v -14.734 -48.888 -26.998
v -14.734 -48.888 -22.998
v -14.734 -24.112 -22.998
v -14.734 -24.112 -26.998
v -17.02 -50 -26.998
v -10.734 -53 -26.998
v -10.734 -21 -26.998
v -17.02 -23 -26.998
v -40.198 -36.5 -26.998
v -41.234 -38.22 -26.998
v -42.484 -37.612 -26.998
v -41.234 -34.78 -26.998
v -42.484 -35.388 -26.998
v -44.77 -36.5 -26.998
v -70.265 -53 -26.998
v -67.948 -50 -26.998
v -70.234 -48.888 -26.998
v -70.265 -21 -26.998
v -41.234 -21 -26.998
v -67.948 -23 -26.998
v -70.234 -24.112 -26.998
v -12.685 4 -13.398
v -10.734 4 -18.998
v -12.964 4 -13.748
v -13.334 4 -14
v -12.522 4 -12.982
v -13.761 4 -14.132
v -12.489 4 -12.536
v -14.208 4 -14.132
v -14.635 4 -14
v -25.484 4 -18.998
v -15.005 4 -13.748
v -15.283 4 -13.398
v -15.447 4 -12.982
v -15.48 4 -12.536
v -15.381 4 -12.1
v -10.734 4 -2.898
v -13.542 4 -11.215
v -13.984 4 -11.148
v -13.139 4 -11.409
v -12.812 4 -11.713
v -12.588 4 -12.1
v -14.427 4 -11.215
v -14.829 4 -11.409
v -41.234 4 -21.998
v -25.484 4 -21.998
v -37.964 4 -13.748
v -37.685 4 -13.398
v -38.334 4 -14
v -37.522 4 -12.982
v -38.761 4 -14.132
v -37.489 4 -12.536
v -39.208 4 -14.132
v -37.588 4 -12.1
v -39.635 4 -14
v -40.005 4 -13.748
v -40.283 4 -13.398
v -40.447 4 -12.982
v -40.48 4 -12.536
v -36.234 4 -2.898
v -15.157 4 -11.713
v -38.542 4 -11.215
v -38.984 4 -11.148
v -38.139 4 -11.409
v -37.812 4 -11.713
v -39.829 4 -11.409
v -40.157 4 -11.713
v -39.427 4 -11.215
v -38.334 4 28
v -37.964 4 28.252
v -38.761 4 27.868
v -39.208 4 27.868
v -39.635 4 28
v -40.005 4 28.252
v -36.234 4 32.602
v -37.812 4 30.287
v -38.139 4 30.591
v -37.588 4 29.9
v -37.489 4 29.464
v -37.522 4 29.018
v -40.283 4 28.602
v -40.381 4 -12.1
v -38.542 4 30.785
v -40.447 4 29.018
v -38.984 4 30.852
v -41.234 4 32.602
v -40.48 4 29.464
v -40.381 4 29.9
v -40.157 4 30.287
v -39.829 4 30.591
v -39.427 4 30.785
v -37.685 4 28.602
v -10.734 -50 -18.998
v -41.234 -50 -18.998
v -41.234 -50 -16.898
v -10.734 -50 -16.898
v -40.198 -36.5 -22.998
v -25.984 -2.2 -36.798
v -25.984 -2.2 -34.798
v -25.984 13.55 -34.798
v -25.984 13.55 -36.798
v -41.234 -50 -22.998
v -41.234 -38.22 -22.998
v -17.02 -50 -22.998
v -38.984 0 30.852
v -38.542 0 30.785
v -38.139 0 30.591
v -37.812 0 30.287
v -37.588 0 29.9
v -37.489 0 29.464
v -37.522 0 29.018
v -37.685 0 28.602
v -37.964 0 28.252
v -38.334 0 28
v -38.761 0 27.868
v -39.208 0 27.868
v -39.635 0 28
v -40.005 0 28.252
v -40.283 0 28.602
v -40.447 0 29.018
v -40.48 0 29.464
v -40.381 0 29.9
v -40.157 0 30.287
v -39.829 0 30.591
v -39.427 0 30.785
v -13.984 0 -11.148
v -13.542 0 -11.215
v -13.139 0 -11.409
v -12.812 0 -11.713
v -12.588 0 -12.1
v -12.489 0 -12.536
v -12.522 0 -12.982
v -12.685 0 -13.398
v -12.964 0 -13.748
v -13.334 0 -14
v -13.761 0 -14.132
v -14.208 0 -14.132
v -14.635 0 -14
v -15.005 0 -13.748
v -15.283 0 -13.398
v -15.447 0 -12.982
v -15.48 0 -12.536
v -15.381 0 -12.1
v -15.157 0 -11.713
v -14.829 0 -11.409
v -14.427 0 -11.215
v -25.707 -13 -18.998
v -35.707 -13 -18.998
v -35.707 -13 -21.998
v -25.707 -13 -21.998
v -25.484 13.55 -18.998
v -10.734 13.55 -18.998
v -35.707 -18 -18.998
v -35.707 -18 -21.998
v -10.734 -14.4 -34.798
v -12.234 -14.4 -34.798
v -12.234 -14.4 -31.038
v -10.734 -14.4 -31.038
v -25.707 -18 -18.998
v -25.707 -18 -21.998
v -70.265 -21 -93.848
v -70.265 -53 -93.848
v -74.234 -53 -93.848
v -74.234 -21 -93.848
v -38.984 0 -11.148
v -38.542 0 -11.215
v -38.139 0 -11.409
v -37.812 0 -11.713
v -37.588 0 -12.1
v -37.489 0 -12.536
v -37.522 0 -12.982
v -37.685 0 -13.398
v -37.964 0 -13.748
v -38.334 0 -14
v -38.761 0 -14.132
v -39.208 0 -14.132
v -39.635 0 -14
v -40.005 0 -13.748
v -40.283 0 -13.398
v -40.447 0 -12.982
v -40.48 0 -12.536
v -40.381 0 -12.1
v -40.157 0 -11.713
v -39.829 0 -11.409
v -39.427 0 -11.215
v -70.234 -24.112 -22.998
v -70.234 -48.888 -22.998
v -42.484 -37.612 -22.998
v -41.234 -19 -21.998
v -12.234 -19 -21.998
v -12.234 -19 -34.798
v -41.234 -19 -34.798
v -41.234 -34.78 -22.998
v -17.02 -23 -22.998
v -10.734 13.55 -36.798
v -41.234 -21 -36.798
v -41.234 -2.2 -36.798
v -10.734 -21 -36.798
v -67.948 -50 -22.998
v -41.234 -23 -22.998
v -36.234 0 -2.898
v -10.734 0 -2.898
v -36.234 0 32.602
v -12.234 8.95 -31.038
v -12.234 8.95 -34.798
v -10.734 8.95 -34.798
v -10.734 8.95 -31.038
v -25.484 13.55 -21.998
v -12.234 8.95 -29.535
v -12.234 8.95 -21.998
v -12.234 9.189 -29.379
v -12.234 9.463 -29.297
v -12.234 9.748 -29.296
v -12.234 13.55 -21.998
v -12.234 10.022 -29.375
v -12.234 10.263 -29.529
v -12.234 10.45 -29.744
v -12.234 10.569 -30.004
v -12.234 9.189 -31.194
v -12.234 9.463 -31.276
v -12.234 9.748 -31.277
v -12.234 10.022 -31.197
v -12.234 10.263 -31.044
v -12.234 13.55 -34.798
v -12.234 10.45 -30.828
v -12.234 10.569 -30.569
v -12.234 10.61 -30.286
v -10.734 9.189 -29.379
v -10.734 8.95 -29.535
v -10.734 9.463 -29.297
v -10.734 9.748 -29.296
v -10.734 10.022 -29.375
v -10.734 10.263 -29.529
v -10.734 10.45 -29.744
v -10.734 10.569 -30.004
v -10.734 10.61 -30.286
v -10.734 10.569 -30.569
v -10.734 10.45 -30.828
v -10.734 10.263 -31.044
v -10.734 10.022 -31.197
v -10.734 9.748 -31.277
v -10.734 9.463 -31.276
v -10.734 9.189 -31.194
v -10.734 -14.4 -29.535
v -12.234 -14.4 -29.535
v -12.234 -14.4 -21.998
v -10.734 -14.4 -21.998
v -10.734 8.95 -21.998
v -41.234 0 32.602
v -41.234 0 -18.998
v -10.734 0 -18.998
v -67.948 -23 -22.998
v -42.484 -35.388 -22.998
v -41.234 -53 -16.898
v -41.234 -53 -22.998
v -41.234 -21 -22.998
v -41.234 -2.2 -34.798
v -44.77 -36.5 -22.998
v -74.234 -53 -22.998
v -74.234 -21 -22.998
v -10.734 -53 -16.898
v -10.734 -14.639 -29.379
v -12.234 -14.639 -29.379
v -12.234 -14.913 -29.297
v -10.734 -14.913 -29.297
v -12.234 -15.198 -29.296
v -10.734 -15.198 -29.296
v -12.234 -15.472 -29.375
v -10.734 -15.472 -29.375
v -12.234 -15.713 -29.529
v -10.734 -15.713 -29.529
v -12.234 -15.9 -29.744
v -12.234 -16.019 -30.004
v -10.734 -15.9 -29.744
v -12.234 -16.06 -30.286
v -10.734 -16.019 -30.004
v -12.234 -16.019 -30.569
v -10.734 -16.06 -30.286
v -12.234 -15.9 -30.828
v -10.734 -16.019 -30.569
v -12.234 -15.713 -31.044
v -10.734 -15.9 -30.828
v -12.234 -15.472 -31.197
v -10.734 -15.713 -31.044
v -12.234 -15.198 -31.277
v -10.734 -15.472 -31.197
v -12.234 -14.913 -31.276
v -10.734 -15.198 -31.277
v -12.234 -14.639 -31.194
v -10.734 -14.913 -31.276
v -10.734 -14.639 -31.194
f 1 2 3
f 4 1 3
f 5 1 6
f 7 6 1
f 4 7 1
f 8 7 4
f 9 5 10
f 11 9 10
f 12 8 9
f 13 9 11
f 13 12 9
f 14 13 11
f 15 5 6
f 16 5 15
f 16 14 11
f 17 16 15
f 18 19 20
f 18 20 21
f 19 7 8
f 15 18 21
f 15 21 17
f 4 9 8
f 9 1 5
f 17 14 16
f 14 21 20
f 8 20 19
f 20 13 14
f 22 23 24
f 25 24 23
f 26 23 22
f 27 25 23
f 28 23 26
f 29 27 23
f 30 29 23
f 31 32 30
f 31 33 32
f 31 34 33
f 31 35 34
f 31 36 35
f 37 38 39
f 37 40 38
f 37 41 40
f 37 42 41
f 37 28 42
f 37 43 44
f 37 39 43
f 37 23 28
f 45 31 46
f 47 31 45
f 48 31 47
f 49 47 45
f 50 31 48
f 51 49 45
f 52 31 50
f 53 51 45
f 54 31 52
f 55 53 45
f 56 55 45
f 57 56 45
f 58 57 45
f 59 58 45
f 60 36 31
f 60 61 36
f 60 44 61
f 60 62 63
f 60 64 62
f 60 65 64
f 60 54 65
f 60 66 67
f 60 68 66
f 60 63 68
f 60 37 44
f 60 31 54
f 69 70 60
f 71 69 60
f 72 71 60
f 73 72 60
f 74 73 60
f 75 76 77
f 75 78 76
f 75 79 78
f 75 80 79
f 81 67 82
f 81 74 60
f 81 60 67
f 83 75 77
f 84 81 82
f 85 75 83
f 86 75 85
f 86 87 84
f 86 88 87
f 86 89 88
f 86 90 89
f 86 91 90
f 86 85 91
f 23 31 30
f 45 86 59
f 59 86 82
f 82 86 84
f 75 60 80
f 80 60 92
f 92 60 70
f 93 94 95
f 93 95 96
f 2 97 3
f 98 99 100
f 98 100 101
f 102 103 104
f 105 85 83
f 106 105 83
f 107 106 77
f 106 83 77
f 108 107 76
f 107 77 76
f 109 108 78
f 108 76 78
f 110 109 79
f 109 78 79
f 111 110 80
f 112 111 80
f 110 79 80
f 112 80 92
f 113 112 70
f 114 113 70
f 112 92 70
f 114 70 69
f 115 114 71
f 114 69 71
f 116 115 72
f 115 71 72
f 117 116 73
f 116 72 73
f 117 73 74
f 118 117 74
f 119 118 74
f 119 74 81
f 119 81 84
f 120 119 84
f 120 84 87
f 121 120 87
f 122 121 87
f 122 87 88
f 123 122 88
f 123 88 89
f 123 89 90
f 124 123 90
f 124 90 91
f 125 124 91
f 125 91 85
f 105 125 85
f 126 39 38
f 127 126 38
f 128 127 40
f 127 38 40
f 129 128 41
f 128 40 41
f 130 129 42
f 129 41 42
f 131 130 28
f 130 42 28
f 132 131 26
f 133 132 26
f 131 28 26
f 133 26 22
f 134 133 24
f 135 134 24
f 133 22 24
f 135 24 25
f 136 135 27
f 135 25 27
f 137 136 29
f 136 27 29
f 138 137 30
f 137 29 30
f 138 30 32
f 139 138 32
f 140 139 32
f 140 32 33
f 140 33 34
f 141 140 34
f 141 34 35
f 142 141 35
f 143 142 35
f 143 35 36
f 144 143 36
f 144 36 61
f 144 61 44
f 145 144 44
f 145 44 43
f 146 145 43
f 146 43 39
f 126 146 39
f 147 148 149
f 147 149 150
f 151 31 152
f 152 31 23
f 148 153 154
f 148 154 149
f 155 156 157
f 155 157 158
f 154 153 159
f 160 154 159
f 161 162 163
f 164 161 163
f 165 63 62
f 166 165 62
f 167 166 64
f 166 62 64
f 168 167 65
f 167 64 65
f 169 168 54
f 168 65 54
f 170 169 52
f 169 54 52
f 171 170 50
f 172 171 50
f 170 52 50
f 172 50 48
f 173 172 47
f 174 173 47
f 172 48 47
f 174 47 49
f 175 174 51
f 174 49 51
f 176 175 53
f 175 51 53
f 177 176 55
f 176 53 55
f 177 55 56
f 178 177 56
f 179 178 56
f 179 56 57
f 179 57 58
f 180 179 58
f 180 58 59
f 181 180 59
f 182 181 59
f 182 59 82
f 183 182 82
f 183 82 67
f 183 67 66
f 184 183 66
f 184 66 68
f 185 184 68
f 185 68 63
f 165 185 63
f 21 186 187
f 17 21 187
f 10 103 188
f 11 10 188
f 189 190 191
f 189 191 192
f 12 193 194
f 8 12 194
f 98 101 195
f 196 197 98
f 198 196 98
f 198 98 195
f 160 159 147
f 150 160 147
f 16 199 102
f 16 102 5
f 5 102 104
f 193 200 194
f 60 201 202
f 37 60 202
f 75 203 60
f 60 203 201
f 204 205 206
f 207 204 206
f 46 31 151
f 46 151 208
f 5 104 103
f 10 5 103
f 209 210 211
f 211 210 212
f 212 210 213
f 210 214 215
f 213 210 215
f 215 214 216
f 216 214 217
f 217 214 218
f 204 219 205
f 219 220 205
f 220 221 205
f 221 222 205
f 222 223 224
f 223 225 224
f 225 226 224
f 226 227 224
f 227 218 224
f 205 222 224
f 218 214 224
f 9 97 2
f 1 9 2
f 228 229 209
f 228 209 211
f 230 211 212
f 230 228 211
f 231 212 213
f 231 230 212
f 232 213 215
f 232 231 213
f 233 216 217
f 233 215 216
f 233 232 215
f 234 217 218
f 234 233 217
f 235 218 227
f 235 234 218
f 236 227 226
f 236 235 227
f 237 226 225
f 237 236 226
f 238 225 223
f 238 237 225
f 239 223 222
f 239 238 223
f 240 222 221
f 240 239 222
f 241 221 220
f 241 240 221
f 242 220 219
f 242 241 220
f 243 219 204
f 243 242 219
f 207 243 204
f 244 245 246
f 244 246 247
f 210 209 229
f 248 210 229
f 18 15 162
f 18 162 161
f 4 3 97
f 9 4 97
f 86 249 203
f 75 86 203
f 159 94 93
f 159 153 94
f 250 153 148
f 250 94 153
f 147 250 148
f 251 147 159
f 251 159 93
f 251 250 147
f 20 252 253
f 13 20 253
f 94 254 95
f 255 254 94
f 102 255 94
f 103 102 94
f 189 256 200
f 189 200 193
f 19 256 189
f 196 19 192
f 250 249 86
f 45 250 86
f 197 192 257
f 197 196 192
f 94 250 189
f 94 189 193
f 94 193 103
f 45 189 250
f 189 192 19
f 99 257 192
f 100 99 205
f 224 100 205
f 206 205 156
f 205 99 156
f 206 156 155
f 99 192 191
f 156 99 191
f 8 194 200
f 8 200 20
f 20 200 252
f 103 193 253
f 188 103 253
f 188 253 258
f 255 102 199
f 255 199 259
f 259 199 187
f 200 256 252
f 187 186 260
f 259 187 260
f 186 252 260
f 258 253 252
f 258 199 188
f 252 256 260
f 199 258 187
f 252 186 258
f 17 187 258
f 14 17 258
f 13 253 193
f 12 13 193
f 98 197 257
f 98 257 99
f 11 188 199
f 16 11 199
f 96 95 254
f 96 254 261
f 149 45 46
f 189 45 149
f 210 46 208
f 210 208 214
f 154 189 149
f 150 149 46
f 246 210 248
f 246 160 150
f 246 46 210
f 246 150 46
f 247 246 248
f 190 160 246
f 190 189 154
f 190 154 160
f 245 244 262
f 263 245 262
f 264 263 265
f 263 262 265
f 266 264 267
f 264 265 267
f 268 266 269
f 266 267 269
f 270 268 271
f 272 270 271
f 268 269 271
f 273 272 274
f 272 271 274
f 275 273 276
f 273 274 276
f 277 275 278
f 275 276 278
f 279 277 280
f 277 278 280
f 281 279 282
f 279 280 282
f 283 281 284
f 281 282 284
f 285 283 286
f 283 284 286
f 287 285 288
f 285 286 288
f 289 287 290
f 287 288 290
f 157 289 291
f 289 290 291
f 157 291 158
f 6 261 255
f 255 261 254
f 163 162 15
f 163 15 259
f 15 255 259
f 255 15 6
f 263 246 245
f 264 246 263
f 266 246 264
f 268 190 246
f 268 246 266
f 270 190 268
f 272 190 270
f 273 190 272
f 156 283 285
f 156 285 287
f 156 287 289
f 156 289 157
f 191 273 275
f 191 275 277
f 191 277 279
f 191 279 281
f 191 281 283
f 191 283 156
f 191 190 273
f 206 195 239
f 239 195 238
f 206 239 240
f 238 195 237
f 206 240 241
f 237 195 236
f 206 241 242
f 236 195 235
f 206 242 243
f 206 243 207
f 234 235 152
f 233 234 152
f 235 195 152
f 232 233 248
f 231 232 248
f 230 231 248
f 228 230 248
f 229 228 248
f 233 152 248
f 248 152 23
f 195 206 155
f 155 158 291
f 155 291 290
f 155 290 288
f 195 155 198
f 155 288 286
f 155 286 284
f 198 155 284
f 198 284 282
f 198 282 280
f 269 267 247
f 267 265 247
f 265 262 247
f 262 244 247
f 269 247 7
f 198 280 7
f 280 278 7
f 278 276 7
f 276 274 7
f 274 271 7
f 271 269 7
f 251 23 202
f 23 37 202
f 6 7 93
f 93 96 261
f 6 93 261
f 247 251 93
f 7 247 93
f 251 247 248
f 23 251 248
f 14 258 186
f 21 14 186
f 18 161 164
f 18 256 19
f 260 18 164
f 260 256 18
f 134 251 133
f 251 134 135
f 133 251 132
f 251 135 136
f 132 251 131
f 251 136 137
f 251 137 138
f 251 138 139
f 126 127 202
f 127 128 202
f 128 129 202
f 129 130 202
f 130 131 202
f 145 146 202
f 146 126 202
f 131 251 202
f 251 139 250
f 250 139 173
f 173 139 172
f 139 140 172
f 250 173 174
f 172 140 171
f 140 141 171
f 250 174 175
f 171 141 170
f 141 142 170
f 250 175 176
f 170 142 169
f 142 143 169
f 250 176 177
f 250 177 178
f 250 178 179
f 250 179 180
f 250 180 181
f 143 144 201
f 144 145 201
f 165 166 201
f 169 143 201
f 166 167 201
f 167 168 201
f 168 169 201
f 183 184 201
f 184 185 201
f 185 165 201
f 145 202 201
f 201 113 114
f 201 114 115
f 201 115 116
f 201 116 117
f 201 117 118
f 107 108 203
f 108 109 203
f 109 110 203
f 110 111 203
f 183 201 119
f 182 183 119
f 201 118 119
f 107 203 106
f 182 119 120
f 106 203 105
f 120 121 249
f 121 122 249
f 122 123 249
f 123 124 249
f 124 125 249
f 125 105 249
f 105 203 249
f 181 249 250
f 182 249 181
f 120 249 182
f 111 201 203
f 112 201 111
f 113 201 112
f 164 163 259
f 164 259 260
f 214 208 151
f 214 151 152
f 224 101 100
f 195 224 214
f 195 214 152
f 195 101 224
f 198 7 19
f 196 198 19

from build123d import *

# Parameters (mm, degrees)
SKETCH1_W            = 25.5
SKETCH1_H            = 14
BOSS_EXTRUDE1_DEPTH  = 4
SKETCH2_R            = 1.5
CUT_EXTRUDE1_DEPTH   = 53.71750714
SKETCH3_W            = 30.5
SKETCH3_H            = 4
BOSS_EXTRUDE2_DEPTH  = 5.1
SKETCH4_W            = 30.5
SKETCH4_H            = 3
BOSS_EXTRUDE3_DEPTH  = 21
SKETCH5_W            = 30.5
SKETCH5_H            = 2
BOSS_EXTRUDE8_DEPTH  = 14.8
SKETCH10_W           = 30.5
SKETCH10_H           = 2
BOSS_EXTRUDE9_DEPTH  = 16.8
SKETCH11_W           = 1.5
SKETCH11_H           = 12.8
BOSS_EXTRUDE10_DEPTH = 4.6
SKETCH13_W           = 15.25
SKETCH13_H           = 2
BOSS_EXTRUDE11_DEPTH = 15.75
SKETCH14_W           = 10
SKETCH14_H           = 5
CUT_EXTRUDE5_DEPTH   = 3
SKETCH16_R           = 1
CUT_EXTRUDE6_DEPTH   = 10
SKETCH15_W           = 14.75
SKETCH15_H           = 3
BOSS_EXTRUDE12_DEPTH = 9.55
SKETCH18_W           = 30.5
SKETCH18_H           = 4
BOSS_EXTRUDE13_DEPTH = 32
SKETCH19_W           = 30.5
SKETCH19_H           = 3
BOSS_EXTRUDE14_DEPTH = 2.1
BOSS_EXTRUDE17_DEPTH = 4
SKETCH24_W           = 3.969230492
SKETCH24_H           = 32
BOSS_EXTRUDE18_DEPTH = 66.85


with BuildPart() as part:
    # Sketch1 → Boss-Extrude1 (new body)
    with BuildSketch(Plane(origin=(0, 0, 0), x_dir=(1, 0, 0), z_dir=(0, 1, 0))):
        Polygon((-36.234375, 16.8984375), (-41.234375, 16.8984375), (-41.234375, -32.6015625), (-36.234375, -32.6015625), (-36.234375, 2.8984375), align=None)
        with Locations((-23.484375, 9.8984375)):
            Rectangle(SKETCH1_W, SKETCH1_H)
    extrude(amount=BOSS_EXTRUDE1_DEPTH)

    # Sketch2 → Cut-Extrude1 (cut, through all)
    with BuildSketch(Plane(origin=(0, 4, 0), x_dir=(1, 0, 0), z_dir=(0, 1, 0))):
        with Locations(Location((-38.984375, -29.3515625, 0), (0, 0, 270))):
            Circle(SKETCH2_R)
        with Locations(Location((-38.984375, 12.6484375, 0), (0, 0, 270))):
            Circle(SKETCH2_R)
        with Locations(Location((-13.984375, 12.6484375, 0), (0, 0, 270))):
            Circle(SKETCH2_R)
    extrude(amount=-CUT_EXTRUDE1_DEPTH, mode=Mode.SUBTRACT)

    # Sketch3 → Boss-Extrude2 (add)
    with BuildSketch(Plane(origin=(0, 0, -16.8984375), x_dir=(-1, 0, 0), z_dir=(0, 0, -1))):
        with Locations((25.984375, 2)):
            Rectangle(SKETCH3_W, SKETCH3_H)
    extrude(amount=BOSS_EXTRUDE2_DEPTH)

    # Sketch4 → Boss-Extrude3 (add)
    with BuildSketch(Plane.XZ):
        with Locations((-25.984375, -20.4984375)):
            Rectangle(SKETCH4_W, SKETCH4_H)
    extrude(amount=BOSS_EXTRUDE3_DEPTH)

    # Sketch5 → Boss-Extrude8 (add)
    with BuildSketch(Plane(origin=(0, 0, -21.9984375), x_dir=(-1, 0, 0), z_dir=(0, 0, -1))):
        with Locations((25.984375, -20)):
            Rectangle(SKETCH5_W, SKETCH5_H)
    extrude(amount=BOSS_EXTRUDE8_DEPTH)

    # Sketch10 → Boss-Extrude9 (add)
    with BuildSketch(Plane(origin=(0, -19, 0), x_dir=(1, 0, 0), z_dir=(0, 1, 0))):
        with Locations((-25.984375, 35.7984375)):
            Rectangle(SKETCH10_W, SKETCH10_H)
    extrude(amount=BOSS_EXTRUDE9_DEPTH)

    # Sketch11 → Boss-Extrude10 (add)
    with BuildSketch(Plane(origin=(0, -19, 0), x_dir=(1, 0, 0), z_dir=(0, 1, 0))):
        with Locations((-11.484375, 28.3984375)):
            Rectangle(SKETCH11_W, SKETCH11_H)
    boss_extrude10 = extrude(amount=BOSS_EXTRUDE10_DEPTH)

    # Sketch13 → Boss-Extrude11 (add)
    with BuildSketch(Plane(origin=(0, -2.2, 0), x_dir=(1, 0, 0), z_dir=(0, 1, 0))):
        with Locations((-18.359375, 35.7984375)):
            Rectangle(SKETCH13_W, SKETCH13_H)
    extrude(amount=BOSS_EXTRUDE11_DEPTH)

    # Sketch14 → Cut-Extrude5 (cut)
    with BuildSketch(Plane.XY.offset(-18.9984375)):
        with Locations((-30.706752917, -15.5)):
            Rectangle(SKETCH14_W, SKETCH14_H)
    extrude(amount=-CUT_EXTRUDE5_DEPTH, mode=Mode.SUBTRACT)

    # Sketch16 → Cut-Extrude6 (cut)
    with BuildSketch(Plane(origin=(-10.734375, 0, 0), x_dir=(0, 0, -1), z_dir=(1, 0, 0))):
        with Locations((30.286455297, -15.059839978)):
            Circle(SKETCH16_R)
    cut_extrude6 = extrude(amount=-CUT_EXTRUDE6_DEPTH, mode=Mode.SUBTRACT)

    # Mirror1: Boss-Extrude10, Cut-Extrude6 across plane
    add(boss_extrude10.mirror(Plane(origin=(0, -2.725, 0), x_dir=(0, 0, 1), z_dir=(0, -1, 0))))
    add(cut_extrude6.mirror(Plane(origin=(0, -2.725, 0), x_dir=(0, 0, 1), z_dir=(0, -1, 0))), mode=Mode.SUBTRACT)

    # Sketch15 → Boss-Extrude12 (add)
    with BuildSketch(Plane(origin=(0, 4, 0), x_dir=(1, 0, 0), z_dir=(0, 1, 0))):
        with Locations((-18.109375, 20.4984375)):
            Rectangle(SKETCH15_W, SKETCH15_H)
    extrude(amount=BOSS_EXTRUDE12_DEPTH)

    # Sketch18 → Boss-Extrude13 (add)
    with BuildSketch(Plane.XZ.offset(21)):
        with Locations((-25.984375, -20.9984375)):
            Rectangle(SKETCH18_W, SKETCH18_H)
    extrude(amount=BOSS_EXTRUDE13_DEPTH)

    # Sketch19 → Boss-Extrude14 (add)
    with BuildSketch(Plane.XY.offset(-18.9984375)):
        with Locations((-25.984375, -51.5)):
            Rectangle(SKETCH19_W, SKETCH19_H)
    extrude(amount=BOSS_EXTRUDE14_DEPTH)

    # Sketch20 → Boss-Extrude17 (add)
    with BuildSketch(Plane(origin=(0, 0, -22.9984375), x_dir=(-1, 0, 0), z_dir=(0, 0, -1))):
        Polygon((14.734375, -24.112056249), (14.734375, -23), (17.020268401, -23), (41.234375, -23), (41.234375, -21), (10.734375, -21), (10.734375, -53), (41.234375, -53), (41.234375, -50), (17.020268401, -50), (14.734375, -50), (14.734375, -48.887943751), align=None)
        Polygon((41.234375, -21), (41.234375, -23), (67.948481599, -23), (70.234375, -23), (70.234375, -24.112056249), (70.234375, -48.887943751), (70.234375, -50), (67.948481599, -50), (41.234375, -50), (41.234375, -53), (74.234375, -53), (74.234375, -21), align=None)
        Polygon((17.020268401, -23), (14.734375, -23), (14.734375, -24.112056249), (40.198481599, -36.5), (14.734375, -48.887943751), (14.734375, -50), (17.020268401, -50), (41.234375, -38.220164357), (41.234375, -34.779835643), align=None)
        Polygon((42.484375, -35.387943751), (41.234375, -34.779835643), (41.234375, -38.220164357), (42.484375, -37.612056249), (67.948481599, -50), (70.234375, -50), (70.234375, -48.887943751), (44.770268401, -36.5), (70.234375, -24.112056249), (70.234375, -23), (67.948481599, -23), align=None)
    extrude(amount=BOSS_EXTRUDE17_DEPTH)

    # Sketch24 → Boss-Extrude18 (add)
    with BuildSketch(Plane(origin=(0, 0, -26.9984375), x_dir=(-1, 0, 0), z_dir=(0, 0, -1))):
        with Locations((72.249759754, -37)):
            Rectangle(SKETCH24_W, SKETCH24_H)
    extrude(amount=BOSS_EXTRUDE18_DEPTH)


solid = part.part
